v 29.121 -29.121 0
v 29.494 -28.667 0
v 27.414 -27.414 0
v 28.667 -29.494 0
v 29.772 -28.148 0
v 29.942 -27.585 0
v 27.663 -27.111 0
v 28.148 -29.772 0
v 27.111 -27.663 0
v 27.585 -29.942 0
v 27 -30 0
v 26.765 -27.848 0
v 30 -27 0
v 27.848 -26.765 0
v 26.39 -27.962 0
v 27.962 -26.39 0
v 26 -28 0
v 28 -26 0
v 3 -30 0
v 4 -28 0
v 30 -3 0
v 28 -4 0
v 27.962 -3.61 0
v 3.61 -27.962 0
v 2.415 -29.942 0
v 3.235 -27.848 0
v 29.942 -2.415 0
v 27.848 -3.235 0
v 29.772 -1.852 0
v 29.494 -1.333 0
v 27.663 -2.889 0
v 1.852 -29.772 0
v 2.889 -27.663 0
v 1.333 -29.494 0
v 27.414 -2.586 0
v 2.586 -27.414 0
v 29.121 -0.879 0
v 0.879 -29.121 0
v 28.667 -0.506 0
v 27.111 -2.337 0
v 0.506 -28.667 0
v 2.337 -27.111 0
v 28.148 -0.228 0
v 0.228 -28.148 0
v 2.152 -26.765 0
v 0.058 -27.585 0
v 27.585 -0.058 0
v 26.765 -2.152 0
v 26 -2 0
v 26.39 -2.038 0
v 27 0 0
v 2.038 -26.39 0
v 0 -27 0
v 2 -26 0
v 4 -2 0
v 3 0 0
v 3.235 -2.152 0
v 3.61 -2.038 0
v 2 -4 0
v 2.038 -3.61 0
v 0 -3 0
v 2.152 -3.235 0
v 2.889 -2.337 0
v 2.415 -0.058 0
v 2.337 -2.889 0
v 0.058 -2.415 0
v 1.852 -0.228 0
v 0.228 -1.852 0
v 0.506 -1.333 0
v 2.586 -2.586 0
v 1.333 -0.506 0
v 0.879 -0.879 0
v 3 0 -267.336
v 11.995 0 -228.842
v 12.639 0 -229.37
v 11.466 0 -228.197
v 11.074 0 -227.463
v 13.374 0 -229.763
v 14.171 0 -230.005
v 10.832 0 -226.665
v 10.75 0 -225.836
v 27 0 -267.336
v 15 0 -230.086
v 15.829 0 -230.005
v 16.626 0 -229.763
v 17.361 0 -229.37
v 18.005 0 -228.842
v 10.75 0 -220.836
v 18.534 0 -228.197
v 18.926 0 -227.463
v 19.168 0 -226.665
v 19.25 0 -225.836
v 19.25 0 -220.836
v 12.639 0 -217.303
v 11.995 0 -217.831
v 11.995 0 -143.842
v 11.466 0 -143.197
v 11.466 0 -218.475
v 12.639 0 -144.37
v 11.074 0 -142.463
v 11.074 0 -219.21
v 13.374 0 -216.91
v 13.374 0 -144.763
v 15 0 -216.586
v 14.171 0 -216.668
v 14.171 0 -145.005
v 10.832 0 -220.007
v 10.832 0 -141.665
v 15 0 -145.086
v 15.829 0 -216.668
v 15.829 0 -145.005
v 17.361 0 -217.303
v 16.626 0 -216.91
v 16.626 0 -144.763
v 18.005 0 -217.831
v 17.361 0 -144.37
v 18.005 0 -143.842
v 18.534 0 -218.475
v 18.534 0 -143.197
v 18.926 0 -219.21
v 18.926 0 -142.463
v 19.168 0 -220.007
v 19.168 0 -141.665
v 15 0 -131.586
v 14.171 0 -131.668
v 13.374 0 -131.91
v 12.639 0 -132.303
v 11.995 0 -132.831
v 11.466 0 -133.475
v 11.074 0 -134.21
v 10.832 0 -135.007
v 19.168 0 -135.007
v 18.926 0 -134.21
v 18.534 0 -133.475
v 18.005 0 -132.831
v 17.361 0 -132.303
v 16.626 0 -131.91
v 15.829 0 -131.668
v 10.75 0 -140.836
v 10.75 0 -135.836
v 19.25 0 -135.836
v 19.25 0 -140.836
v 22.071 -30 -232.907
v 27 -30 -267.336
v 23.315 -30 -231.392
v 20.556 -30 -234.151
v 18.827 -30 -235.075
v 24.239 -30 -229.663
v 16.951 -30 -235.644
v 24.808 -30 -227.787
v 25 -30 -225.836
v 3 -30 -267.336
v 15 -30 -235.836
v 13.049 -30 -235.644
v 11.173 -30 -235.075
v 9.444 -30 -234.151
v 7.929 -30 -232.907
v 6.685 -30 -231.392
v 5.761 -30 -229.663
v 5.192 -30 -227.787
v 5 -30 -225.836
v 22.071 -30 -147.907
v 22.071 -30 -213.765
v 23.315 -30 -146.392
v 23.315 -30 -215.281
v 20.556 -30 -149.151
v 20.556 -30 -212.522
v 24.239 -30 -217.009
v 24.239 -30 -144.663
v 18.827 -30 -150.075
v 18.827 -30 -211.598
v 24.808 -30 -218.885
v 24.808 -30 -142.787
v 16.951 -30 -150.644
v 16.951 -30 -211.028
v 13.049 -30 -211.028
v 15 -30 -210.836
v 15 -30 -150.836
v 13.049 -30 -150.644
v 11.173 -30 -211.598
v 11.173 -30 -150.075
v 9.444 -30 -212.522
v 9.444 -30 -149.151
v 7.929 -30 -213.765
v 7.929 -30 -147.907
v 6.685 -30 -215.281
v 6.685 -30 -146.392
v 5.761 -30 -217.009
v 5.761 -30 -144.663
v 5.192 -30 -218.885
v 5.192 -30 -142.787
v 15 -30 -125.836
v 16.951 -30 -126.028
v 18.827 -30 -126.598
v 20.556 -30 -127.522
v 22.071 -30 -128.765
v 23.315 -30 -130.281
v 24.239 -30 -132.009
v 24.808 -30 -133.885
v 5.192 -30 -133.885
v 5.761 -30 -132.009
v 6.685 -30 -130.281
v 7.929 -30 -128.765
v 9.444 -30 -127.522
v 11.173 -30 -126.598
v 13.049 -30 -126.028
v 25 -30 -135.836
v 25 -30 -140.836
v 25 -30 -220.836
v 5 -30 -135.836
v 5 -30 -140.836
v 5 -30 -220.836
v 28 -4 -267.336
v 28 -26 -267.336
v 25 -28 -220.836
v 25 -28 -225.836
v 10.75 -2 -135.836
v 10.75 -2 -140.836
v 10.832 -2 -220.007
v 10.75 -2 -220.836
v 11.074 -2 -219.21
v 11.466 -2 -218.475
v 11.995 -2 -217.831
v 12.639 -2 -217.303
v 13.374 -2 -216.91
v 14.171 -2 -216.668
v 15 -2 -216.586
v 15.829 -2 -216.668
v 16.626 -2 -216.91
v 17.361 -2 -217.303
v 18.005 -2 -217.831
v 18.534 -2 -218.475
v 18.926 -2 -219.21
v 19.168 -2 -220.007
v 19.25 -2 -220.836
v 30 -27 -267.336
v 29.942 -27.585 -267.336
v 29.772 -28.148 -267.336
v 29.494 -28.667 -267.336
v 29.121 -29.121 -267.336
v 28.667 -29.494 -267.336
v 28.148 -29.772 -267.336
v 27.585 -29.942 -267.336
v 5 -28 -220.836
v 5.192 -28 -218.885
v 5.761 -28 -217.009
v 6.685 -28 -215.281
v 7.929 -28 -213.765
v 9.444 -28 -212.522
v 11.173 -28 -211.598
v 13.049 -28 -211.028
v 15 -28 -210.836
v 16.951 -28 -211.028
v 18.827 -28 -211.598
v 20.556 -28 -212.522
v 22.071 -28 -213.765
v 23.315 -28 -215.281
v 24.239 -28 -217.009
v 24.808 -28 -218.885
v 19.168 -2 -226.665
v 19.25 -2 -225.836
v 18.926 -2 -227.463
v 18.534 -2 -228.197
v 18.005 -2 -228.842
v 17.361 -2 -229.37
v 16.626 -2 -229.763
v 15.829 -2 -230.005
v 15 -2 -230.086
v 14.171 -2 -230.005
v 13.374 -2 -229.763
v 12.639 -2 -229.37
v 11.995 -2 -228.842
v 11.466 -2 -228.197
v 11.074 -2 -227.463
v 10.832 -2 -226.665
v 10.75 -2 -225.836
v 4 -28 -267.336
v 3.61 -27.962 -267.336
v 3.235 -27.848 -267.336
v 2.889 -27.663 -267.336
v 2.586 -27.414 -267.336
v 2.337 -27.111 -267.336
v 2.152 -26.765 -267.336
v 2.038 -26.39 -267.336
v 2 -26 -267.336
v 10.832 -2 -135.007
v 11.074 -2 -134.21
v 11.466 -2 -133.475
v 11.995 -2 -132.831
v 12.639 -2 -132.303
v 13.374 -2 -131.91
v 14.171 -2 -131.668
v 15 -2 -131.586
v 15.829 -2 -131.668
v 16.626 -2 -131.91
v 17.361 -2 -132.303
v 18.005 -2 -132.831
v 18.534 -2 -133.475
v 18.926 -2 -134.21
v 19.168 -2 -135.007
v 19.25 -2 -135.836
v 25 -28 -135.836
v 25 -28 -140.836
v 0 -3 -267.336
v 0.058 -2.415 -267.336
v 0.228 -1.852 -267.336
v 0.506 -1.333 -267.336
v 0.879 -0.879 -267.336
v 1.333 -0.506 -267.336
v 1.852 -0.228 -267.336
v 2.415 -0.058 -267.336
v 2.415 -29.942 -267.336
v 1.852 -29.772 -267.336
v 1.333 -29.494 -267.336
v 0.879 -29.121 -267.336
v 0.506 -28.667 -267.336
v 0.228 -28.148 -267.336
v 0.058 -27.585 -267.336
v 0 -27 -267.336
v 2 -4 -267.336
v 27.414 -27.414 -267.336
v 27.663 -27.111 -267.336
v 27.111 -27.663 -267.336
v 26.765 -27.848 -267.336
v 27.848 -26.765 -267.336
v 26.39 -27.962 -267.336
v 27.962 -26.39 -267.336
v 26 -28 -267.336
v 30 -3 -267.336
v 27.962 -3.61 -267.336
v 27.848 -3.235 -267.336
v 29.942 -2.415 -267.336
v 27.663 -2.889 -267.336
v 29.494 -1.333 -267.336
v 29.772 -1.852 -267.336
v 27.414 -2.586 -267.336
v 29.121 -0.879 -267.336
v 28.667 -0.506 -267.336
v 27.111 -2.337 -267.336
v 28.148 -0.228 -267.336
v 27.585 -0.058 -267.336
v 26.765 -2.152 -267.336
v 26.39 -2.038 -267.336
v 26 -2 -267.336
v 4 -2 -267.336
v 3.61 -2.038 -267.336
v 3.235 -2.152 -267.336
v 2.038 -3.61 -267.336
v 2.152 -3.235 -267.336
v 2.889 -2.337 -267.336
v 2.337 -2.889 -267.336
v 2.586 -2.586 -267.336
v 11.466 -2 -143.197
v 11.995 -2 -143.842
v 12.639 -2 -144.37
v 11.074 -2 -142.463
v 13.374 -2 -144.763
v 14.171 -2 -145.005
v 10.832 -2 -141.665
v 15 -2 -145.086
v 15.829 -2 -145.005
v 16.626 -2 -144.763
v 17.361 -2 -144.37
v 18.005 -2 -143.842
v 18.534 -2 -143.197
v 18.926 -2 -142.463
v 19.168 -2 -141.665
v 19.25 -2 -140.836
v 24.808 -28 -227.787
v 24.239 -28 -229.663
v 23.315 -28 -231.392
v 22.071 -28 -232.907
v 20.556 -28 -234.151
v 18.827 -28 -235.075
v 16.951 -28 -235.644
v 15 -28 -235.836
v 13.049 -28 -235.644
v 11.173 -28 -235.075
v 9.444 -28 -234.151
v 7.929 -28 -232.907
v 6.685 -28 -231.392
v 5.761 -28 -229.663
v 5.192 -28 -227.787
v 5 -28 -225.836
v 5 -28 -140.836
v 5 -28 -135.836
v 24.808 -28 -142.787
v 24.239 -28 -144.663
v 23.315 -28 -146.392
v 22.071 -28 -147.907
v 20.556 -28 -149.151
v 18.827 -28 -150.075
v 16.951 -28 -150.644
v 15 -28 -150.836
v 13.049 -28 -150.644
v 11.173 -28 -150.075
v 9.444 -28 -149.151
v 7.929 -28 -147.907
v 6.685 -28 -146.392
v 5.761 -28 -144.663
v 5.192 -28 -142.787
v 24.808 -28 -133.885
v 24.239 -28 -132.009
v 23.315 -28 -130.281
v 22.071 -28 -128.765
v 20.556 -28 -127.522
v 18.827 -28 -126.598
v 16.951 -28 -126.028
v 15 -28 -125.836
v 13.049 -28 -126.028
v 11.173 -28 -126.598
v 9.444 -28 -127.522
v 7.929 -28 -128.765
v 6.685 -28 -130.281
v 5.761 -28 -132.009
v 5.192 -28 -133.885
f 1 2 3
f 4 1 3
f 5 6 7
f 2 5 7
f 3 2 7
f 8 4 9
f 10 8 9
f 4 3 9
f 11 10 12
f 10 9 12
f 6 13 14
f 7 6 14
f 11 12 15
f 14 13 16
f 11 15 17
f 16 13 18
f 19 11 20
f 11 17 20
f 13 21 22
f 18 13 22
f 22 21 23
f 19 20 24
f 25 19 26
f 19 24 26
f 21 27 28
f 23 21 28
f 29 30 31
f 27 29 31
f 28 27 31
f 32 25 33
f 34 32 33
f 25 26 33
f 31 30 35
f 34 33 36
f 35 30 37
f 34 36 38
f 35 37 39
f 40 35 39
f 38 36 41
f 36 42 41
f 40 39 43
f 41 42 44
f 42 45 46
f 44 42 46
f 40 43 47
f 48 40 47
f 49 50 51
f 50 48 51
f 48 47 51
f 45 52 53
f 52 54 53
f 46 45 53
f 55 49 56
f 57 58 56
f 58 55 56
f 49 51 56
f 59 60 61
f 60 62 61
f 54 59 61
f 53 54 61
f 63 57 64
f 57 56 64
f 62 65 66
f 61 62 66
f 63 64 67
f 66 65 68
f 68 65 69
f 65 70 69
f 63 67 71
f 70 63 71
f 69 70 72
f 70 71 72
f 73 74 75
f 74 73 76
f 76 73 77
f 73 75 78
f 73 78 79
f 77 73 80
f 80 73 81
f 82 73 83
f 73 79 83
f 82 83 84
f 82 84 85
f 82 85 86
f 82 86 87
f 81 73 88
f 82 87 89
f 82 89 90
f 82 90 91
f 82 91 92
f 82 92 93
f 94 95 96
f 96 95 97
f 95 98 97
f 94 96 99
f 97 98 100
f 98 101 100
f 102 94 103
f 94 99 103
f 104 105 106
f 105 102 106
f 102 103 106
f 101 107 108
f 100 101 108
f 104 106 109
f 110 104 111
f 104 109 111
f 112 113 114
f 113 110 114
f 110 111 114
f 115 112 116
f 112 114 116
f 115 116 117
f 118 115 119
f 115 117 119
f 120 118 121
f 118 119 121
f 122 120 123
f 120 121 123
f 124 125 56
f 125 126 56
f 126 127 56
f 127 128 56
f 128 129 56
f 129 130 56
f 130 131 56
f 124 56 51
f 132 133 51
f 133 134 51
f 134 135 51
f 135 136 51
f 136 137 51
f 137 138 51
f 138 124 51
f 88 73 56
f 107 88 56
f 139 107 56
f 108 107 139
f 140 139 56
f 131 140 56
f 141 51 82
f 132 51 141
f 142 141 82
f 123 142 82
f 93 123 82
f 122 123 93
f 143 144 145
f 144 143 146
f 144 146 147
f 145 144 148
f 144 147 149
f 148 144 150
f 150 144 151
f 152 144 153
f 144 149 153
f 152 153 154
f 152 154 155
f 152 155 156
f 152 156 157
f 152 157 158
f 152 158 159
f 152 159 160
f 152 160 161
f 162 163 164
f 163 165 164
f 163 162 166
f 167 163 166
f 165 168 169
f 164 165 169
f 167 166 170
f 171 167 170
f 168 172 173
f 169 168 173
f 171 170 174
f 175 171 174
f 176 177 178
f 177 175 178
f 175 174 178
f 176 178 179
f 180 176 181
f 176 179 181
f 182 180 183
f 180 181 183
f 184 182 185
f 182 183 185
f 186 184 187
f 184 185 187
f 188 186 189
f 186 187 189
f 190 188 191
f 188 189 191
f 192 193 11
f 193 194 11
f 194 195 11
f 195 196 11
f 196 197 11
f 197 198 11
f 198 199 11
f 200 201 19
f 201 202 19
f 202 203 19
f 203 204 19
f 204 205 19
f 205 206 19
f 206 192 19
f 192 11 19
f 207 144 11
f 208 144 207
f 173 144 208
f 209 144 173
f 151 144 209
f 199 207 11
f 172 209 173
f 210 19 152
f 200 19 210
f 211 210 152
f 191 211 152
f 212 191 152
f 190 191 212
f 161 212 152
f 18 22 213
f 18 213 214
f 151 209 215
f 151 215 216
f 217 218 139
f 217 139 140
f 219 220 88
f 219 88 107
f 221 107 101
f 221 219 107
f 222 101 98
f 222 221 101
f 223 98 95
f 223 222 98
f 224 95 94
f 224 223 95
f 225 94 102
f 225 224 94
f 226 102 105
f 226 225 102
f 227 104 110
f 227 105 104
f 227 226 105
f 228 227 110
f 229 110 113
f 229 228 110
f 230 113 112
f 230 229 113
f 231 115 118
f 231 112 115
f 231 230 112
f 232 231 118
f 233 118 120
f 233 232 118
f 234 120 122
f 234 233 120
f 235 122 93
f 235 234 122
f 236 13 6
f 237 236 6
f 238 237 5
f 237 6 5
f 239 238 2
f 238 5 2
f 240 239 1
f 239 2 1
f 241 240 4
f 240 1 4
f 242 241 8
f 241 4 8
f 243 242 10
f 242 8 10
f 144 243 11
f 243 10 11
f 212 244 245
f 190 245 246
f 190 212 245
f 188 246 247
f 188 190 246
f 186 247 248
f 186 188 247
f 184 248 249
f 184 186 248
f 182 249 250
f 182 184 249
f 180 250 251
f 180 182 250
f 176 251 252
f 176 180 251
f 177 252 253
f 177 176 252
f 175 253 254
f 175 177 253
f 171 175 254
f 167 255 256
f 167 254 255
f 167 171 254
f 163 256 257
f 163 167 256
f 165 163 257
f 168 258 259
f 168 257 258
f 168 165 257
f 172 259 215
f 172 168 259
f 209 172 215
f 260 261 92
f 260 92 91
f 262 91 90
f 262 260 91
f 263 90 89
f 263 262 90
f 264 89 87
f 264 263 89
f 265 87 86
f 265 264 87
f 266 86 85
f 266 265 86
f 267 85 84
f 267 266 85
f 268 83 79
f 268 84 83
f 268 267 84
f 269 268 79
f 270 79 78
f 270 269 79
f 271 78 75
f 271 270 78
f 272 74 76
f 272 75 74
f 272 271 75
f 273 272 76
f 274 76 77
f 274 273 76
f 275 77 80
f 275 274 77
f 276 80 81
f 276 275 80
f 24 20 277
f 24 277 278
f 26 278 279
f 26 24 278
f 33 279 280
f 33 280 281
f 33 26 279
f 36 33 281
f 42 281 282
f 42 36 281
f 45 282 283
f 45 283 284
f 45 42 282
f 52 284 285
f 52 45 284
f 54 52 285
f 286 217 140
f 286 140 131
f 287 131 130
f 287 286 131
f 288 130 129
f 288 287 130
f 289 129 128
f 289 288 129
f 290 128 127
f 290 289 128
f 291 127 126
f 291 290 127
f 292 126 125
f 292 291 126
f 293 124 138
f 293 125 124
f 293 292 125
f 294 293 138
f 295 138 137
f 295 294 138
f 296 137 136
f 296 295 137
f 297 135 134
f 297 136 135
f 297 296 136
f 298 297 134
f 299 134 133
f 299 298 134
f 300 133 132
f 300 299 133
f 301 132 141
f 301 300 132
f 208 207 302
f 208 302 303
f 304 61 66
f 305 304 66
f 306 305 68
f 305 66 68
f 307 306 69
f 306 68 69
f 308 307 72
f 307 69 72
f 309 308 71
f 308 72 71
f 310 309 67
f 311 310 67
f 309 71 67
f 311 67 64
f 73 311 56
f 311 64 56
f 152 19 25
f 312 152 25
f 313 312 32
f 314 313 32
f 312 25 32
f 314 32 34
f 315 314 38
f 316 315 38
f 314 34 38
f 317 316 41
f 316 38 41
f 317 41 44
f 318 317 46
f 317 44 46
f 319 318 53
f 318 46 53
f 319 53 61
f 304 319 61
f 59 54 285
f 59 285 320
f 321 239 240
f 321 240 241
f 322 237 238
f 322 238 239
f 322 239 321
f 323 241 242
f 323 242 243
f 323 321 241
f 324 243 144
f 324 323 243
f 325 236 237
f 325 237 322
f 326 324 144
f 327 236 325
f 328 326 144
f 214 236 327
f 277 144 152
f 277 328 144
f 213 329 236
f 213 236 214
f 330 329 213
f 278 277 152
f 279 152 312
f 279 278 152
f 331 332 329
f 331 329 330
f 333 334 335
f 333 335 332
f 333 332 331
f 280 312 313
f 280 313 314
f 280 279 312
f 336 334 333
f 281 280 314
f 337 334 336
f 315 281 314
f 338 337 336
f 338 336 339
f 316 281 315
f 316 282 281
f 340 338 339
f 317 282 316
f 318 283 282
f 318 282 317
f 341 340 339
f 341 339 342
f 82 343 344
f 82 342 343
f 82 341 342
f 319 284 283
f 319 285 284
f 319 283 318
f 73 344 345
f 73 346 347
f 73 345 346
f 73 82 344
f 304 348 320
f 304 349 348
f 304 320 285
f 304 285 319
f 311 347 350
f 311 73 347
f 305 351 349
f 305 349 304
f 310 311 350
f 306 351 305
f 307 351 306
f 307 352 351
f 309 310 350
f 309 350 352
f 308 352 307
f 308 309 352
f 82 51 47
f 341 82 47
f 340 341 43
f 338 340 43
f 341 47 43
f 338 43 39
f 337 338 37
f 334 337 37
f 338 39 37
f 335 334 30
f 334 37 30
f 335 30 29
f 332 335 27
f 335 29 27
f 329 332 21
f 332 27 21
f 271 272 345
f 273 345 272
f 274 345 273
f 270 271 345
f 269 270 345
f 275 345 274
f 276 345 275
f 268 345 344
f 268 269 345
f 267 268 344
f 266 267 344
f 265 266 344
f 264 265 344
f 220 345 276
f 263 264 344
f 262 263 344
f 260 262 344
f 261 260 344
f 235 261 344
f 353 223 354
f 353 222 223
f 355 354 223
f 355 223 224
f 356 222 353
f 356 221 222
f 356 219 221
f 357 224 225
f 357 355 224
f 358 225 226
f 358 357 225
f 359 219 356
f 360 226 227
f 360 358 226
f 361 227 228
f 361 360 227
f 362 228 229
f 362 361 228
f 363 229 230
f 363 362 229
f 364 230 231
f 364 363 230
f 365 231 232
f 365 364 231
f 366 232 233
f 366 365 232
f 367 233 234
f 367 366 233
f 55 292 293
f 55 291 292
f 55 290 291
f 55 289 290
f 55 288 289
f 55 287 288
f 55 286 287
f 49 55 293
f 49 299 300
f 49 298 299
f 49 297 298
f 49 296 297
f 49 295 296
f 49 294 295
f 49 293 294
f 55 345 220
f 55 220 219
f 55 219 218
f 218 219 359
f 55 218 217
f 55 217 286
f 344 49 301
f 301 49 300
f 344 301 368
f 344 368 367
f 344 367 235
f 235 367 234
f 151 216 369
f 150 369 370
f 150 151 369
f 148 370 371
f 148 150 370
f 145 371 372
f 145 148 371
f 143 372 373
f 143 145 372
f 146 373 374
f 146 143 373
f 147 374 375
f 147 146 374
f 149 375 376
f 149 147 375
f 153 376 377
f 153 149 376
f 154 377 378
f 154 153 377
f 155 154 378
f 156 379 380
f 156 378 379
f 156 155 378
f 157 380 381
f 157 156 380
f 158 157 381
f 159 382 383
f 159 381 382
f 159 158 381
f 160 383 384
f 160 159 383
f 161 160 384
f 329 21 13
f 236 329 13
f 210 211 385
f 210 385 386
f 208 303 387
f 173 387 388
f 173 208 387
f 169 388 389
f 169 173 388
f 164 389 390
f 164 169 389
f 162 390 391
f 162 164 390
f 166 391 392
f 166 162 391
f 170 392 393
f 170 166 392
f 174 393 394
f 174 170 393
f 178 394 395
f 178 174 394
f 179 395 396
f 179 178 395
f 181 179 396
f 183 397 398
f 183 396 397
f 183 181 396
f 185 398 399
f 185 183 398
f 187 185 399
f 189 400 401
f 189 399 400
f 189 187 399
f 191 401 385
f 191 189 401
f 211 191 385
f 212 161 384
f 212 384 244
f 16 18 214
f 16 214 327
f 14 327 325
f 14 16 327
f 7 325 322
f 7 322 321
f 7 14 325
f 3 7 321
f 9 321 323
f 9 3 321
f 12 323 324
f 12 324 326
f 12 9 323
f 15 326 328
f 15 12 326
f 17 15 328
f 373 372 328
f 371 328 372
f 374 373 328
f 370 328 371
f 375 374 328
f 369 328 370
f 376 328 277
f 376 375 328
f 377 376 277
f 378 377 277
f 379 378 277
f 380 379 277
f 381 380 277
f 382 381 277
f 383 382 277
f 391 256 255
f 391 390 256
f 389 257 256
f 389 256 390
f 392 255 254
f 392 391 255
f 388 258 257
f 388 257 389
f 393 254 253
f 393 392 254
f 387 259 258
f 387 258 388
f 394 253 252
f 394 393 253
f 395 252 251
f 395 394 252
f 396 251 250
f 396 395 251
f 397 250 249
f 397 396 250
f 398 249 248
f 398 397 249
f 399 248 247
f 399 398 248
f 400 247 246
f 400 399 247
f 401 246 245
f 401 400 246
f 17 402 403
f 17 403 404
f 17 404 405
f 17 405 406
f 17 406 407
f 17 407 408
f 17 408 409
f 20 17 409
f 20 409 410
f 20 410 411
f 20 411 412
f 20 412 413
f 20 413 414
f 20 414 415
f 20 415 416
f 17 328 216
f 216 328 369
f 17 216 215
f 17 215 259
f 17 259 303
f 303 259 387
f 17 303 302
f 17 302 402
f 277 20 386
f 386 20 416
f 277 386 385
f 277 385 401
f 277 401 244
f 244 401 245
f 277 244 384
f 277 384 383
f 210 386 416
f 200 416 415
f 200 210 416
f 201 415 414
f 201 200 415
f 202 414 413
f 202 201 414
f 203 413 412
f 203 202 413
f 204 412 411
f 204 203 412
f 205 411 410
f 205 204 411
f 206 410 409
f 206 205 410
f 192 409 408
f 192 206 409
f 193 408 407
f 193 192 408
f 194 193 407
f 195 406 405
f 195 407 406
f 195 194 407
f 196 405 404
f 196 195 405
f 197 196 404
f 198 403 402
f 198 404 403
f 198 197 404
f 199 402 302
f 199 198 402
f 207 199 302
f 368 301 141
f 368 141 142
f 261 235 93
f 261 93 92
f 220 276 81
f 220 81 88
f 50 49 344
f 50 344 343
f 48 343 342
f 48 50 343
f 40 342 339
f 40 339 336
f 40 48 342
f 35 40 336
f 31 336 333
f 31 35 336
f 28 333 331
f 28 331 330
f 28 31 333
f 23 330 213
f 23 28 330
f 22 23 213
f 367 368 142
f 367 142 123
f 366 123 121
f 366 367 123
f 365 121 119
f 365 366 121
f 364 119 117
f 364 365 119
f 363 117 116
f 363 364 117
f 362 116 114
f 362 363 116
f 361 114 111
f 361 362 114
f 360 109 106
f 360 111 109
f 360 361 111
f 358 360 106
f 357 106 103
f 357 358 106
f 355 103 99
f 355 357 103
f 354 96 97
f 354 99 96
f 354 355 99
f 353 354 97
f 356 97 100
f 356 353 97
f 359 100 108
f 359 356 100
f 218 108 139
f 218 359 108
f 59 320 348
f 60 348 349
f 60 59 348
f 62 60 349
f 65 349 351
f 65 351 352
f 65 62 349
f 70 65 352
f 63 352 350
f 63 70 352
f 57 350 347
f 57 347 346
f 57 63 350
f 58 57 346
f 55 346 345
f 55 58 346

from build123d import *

# Parameters (mm, degrees)
EXTRUDE_1_DEPTH     = 267.336309
CUT_EXTRUDE_1_DEPTH = 31
CUT_EXTRUDE_2_DEPTH = 10


with BuildPart() as part:
    # Эскиз1 → Бобышка-Вытянуть1 (new body)
    with BuildSketch(Plane.XY):
        with BuildLine():
            Line((3, 0), (27, 0))
            ThreePointArc((27, 0), (29.121320344, -0.878679656), (30, -3))
            Line((30, -3), (30, -27))
            ThreePointArc((30, -27), (29.121320344, -29.121320344), (27, -30))
            Line((27, -30), (3, -30))
            ThreePointArc((3, -30), (0.878679656, -29.121320344), (0, -27))
            Line((0, -27), (0, -3))
            ThreePointArc((0, -3), (0.878679656, -0.878679656), (3, 0))
        make_face()
        with BuildLine():
            Line((4, -2), (26, -2))
            ThreePointArc((26, -2), (27.414213562, -2.585786438), (28, -4))
            Line((28, -4), (28, -26))
            ThreePointArc((28, -26), (27.414213562, -27.414213562), (26, -28))
            Line((26, -28), (4, -28))
            ThreePointArc((4, -28), (2.585786438, -27.414213562), (2, -26))
            Line((2, -26), (2, -4))
            ThreePointArc((2, -4), (2.585786438, -2.585786438), (4, -2))
        make_face(mode=Mode.SUBTRACT)
    extrude(amount=-EXTRUDE_1_DEPTH)

    # Эскиз2 → Вырез-Вытянуть1 (cut, through all)
    with BuildSketch(Plane.XZ.offset(30)):
        with BuildLine():
            Line((19.25, -135.836309448), (19.25, -140.836309448))
            ThreePointArc((19.25, -140.836309448), (15, -145.086309448), (10.75, -140.836309448))
            Line((10.75, -140.836309448), (10.75, -135.836309448))
            ThreePointArc((10.75, -135.836309448), (15, -131.586309448), (19.25, -135.836309448))
        make_face()
        with BuildLine():
            Line((10.75, -225.836309448), (10.75, -220.836309448))
            ThreePointArc((10.75, -220.836309448), (15, -216.586309448), (19.25, -220.836309448))
            Line((19.25, -220.836309448), (19.25, -225.836309448))
            ThreePointArc((19.25, -225.836309448), (15, -230.086309448), (10.75, -225.836309448))
        make_face()
    extrude(amount=-CUT_EXTRUDE_1_DEPTH, mode=Mode.SUBTRACT)

    # Эскиз3 → Вырез-Вытянуть2 (cut)
    with BuildSketch(Plane.XZ.offset(30)):
        with BuildLine():
            Line((5, -140.836309448), (5, -135.836309448))
            ThreePointArc((5, -135.836309448), (15, -125.836309448), (25, -135.836309448))
            Line((25, -135.836309448), (25, -140.836309448))
            ThreePointArc((25, -140.836309448), (15, -150.836309448), (5, -140.836309448))
        make_face()
        with BuildLine():
            Line((5, -225.836309448), (5, -220.836309448))
            ThreePointArc((5, -220.836309448), (15, -210.836309448), (25, -220.836309448))
            Line((25, -220.836309448), (25, -225.836309448))
            ThreePointArc((25, -225.836309448), (15, -235.836309448), (5, -225.836309448))
        make_face()
    extrude(amount=-CUT_EXTRUDE_2_DEPTH, mode=Mode.SUBTRACT)


solid = part.part
